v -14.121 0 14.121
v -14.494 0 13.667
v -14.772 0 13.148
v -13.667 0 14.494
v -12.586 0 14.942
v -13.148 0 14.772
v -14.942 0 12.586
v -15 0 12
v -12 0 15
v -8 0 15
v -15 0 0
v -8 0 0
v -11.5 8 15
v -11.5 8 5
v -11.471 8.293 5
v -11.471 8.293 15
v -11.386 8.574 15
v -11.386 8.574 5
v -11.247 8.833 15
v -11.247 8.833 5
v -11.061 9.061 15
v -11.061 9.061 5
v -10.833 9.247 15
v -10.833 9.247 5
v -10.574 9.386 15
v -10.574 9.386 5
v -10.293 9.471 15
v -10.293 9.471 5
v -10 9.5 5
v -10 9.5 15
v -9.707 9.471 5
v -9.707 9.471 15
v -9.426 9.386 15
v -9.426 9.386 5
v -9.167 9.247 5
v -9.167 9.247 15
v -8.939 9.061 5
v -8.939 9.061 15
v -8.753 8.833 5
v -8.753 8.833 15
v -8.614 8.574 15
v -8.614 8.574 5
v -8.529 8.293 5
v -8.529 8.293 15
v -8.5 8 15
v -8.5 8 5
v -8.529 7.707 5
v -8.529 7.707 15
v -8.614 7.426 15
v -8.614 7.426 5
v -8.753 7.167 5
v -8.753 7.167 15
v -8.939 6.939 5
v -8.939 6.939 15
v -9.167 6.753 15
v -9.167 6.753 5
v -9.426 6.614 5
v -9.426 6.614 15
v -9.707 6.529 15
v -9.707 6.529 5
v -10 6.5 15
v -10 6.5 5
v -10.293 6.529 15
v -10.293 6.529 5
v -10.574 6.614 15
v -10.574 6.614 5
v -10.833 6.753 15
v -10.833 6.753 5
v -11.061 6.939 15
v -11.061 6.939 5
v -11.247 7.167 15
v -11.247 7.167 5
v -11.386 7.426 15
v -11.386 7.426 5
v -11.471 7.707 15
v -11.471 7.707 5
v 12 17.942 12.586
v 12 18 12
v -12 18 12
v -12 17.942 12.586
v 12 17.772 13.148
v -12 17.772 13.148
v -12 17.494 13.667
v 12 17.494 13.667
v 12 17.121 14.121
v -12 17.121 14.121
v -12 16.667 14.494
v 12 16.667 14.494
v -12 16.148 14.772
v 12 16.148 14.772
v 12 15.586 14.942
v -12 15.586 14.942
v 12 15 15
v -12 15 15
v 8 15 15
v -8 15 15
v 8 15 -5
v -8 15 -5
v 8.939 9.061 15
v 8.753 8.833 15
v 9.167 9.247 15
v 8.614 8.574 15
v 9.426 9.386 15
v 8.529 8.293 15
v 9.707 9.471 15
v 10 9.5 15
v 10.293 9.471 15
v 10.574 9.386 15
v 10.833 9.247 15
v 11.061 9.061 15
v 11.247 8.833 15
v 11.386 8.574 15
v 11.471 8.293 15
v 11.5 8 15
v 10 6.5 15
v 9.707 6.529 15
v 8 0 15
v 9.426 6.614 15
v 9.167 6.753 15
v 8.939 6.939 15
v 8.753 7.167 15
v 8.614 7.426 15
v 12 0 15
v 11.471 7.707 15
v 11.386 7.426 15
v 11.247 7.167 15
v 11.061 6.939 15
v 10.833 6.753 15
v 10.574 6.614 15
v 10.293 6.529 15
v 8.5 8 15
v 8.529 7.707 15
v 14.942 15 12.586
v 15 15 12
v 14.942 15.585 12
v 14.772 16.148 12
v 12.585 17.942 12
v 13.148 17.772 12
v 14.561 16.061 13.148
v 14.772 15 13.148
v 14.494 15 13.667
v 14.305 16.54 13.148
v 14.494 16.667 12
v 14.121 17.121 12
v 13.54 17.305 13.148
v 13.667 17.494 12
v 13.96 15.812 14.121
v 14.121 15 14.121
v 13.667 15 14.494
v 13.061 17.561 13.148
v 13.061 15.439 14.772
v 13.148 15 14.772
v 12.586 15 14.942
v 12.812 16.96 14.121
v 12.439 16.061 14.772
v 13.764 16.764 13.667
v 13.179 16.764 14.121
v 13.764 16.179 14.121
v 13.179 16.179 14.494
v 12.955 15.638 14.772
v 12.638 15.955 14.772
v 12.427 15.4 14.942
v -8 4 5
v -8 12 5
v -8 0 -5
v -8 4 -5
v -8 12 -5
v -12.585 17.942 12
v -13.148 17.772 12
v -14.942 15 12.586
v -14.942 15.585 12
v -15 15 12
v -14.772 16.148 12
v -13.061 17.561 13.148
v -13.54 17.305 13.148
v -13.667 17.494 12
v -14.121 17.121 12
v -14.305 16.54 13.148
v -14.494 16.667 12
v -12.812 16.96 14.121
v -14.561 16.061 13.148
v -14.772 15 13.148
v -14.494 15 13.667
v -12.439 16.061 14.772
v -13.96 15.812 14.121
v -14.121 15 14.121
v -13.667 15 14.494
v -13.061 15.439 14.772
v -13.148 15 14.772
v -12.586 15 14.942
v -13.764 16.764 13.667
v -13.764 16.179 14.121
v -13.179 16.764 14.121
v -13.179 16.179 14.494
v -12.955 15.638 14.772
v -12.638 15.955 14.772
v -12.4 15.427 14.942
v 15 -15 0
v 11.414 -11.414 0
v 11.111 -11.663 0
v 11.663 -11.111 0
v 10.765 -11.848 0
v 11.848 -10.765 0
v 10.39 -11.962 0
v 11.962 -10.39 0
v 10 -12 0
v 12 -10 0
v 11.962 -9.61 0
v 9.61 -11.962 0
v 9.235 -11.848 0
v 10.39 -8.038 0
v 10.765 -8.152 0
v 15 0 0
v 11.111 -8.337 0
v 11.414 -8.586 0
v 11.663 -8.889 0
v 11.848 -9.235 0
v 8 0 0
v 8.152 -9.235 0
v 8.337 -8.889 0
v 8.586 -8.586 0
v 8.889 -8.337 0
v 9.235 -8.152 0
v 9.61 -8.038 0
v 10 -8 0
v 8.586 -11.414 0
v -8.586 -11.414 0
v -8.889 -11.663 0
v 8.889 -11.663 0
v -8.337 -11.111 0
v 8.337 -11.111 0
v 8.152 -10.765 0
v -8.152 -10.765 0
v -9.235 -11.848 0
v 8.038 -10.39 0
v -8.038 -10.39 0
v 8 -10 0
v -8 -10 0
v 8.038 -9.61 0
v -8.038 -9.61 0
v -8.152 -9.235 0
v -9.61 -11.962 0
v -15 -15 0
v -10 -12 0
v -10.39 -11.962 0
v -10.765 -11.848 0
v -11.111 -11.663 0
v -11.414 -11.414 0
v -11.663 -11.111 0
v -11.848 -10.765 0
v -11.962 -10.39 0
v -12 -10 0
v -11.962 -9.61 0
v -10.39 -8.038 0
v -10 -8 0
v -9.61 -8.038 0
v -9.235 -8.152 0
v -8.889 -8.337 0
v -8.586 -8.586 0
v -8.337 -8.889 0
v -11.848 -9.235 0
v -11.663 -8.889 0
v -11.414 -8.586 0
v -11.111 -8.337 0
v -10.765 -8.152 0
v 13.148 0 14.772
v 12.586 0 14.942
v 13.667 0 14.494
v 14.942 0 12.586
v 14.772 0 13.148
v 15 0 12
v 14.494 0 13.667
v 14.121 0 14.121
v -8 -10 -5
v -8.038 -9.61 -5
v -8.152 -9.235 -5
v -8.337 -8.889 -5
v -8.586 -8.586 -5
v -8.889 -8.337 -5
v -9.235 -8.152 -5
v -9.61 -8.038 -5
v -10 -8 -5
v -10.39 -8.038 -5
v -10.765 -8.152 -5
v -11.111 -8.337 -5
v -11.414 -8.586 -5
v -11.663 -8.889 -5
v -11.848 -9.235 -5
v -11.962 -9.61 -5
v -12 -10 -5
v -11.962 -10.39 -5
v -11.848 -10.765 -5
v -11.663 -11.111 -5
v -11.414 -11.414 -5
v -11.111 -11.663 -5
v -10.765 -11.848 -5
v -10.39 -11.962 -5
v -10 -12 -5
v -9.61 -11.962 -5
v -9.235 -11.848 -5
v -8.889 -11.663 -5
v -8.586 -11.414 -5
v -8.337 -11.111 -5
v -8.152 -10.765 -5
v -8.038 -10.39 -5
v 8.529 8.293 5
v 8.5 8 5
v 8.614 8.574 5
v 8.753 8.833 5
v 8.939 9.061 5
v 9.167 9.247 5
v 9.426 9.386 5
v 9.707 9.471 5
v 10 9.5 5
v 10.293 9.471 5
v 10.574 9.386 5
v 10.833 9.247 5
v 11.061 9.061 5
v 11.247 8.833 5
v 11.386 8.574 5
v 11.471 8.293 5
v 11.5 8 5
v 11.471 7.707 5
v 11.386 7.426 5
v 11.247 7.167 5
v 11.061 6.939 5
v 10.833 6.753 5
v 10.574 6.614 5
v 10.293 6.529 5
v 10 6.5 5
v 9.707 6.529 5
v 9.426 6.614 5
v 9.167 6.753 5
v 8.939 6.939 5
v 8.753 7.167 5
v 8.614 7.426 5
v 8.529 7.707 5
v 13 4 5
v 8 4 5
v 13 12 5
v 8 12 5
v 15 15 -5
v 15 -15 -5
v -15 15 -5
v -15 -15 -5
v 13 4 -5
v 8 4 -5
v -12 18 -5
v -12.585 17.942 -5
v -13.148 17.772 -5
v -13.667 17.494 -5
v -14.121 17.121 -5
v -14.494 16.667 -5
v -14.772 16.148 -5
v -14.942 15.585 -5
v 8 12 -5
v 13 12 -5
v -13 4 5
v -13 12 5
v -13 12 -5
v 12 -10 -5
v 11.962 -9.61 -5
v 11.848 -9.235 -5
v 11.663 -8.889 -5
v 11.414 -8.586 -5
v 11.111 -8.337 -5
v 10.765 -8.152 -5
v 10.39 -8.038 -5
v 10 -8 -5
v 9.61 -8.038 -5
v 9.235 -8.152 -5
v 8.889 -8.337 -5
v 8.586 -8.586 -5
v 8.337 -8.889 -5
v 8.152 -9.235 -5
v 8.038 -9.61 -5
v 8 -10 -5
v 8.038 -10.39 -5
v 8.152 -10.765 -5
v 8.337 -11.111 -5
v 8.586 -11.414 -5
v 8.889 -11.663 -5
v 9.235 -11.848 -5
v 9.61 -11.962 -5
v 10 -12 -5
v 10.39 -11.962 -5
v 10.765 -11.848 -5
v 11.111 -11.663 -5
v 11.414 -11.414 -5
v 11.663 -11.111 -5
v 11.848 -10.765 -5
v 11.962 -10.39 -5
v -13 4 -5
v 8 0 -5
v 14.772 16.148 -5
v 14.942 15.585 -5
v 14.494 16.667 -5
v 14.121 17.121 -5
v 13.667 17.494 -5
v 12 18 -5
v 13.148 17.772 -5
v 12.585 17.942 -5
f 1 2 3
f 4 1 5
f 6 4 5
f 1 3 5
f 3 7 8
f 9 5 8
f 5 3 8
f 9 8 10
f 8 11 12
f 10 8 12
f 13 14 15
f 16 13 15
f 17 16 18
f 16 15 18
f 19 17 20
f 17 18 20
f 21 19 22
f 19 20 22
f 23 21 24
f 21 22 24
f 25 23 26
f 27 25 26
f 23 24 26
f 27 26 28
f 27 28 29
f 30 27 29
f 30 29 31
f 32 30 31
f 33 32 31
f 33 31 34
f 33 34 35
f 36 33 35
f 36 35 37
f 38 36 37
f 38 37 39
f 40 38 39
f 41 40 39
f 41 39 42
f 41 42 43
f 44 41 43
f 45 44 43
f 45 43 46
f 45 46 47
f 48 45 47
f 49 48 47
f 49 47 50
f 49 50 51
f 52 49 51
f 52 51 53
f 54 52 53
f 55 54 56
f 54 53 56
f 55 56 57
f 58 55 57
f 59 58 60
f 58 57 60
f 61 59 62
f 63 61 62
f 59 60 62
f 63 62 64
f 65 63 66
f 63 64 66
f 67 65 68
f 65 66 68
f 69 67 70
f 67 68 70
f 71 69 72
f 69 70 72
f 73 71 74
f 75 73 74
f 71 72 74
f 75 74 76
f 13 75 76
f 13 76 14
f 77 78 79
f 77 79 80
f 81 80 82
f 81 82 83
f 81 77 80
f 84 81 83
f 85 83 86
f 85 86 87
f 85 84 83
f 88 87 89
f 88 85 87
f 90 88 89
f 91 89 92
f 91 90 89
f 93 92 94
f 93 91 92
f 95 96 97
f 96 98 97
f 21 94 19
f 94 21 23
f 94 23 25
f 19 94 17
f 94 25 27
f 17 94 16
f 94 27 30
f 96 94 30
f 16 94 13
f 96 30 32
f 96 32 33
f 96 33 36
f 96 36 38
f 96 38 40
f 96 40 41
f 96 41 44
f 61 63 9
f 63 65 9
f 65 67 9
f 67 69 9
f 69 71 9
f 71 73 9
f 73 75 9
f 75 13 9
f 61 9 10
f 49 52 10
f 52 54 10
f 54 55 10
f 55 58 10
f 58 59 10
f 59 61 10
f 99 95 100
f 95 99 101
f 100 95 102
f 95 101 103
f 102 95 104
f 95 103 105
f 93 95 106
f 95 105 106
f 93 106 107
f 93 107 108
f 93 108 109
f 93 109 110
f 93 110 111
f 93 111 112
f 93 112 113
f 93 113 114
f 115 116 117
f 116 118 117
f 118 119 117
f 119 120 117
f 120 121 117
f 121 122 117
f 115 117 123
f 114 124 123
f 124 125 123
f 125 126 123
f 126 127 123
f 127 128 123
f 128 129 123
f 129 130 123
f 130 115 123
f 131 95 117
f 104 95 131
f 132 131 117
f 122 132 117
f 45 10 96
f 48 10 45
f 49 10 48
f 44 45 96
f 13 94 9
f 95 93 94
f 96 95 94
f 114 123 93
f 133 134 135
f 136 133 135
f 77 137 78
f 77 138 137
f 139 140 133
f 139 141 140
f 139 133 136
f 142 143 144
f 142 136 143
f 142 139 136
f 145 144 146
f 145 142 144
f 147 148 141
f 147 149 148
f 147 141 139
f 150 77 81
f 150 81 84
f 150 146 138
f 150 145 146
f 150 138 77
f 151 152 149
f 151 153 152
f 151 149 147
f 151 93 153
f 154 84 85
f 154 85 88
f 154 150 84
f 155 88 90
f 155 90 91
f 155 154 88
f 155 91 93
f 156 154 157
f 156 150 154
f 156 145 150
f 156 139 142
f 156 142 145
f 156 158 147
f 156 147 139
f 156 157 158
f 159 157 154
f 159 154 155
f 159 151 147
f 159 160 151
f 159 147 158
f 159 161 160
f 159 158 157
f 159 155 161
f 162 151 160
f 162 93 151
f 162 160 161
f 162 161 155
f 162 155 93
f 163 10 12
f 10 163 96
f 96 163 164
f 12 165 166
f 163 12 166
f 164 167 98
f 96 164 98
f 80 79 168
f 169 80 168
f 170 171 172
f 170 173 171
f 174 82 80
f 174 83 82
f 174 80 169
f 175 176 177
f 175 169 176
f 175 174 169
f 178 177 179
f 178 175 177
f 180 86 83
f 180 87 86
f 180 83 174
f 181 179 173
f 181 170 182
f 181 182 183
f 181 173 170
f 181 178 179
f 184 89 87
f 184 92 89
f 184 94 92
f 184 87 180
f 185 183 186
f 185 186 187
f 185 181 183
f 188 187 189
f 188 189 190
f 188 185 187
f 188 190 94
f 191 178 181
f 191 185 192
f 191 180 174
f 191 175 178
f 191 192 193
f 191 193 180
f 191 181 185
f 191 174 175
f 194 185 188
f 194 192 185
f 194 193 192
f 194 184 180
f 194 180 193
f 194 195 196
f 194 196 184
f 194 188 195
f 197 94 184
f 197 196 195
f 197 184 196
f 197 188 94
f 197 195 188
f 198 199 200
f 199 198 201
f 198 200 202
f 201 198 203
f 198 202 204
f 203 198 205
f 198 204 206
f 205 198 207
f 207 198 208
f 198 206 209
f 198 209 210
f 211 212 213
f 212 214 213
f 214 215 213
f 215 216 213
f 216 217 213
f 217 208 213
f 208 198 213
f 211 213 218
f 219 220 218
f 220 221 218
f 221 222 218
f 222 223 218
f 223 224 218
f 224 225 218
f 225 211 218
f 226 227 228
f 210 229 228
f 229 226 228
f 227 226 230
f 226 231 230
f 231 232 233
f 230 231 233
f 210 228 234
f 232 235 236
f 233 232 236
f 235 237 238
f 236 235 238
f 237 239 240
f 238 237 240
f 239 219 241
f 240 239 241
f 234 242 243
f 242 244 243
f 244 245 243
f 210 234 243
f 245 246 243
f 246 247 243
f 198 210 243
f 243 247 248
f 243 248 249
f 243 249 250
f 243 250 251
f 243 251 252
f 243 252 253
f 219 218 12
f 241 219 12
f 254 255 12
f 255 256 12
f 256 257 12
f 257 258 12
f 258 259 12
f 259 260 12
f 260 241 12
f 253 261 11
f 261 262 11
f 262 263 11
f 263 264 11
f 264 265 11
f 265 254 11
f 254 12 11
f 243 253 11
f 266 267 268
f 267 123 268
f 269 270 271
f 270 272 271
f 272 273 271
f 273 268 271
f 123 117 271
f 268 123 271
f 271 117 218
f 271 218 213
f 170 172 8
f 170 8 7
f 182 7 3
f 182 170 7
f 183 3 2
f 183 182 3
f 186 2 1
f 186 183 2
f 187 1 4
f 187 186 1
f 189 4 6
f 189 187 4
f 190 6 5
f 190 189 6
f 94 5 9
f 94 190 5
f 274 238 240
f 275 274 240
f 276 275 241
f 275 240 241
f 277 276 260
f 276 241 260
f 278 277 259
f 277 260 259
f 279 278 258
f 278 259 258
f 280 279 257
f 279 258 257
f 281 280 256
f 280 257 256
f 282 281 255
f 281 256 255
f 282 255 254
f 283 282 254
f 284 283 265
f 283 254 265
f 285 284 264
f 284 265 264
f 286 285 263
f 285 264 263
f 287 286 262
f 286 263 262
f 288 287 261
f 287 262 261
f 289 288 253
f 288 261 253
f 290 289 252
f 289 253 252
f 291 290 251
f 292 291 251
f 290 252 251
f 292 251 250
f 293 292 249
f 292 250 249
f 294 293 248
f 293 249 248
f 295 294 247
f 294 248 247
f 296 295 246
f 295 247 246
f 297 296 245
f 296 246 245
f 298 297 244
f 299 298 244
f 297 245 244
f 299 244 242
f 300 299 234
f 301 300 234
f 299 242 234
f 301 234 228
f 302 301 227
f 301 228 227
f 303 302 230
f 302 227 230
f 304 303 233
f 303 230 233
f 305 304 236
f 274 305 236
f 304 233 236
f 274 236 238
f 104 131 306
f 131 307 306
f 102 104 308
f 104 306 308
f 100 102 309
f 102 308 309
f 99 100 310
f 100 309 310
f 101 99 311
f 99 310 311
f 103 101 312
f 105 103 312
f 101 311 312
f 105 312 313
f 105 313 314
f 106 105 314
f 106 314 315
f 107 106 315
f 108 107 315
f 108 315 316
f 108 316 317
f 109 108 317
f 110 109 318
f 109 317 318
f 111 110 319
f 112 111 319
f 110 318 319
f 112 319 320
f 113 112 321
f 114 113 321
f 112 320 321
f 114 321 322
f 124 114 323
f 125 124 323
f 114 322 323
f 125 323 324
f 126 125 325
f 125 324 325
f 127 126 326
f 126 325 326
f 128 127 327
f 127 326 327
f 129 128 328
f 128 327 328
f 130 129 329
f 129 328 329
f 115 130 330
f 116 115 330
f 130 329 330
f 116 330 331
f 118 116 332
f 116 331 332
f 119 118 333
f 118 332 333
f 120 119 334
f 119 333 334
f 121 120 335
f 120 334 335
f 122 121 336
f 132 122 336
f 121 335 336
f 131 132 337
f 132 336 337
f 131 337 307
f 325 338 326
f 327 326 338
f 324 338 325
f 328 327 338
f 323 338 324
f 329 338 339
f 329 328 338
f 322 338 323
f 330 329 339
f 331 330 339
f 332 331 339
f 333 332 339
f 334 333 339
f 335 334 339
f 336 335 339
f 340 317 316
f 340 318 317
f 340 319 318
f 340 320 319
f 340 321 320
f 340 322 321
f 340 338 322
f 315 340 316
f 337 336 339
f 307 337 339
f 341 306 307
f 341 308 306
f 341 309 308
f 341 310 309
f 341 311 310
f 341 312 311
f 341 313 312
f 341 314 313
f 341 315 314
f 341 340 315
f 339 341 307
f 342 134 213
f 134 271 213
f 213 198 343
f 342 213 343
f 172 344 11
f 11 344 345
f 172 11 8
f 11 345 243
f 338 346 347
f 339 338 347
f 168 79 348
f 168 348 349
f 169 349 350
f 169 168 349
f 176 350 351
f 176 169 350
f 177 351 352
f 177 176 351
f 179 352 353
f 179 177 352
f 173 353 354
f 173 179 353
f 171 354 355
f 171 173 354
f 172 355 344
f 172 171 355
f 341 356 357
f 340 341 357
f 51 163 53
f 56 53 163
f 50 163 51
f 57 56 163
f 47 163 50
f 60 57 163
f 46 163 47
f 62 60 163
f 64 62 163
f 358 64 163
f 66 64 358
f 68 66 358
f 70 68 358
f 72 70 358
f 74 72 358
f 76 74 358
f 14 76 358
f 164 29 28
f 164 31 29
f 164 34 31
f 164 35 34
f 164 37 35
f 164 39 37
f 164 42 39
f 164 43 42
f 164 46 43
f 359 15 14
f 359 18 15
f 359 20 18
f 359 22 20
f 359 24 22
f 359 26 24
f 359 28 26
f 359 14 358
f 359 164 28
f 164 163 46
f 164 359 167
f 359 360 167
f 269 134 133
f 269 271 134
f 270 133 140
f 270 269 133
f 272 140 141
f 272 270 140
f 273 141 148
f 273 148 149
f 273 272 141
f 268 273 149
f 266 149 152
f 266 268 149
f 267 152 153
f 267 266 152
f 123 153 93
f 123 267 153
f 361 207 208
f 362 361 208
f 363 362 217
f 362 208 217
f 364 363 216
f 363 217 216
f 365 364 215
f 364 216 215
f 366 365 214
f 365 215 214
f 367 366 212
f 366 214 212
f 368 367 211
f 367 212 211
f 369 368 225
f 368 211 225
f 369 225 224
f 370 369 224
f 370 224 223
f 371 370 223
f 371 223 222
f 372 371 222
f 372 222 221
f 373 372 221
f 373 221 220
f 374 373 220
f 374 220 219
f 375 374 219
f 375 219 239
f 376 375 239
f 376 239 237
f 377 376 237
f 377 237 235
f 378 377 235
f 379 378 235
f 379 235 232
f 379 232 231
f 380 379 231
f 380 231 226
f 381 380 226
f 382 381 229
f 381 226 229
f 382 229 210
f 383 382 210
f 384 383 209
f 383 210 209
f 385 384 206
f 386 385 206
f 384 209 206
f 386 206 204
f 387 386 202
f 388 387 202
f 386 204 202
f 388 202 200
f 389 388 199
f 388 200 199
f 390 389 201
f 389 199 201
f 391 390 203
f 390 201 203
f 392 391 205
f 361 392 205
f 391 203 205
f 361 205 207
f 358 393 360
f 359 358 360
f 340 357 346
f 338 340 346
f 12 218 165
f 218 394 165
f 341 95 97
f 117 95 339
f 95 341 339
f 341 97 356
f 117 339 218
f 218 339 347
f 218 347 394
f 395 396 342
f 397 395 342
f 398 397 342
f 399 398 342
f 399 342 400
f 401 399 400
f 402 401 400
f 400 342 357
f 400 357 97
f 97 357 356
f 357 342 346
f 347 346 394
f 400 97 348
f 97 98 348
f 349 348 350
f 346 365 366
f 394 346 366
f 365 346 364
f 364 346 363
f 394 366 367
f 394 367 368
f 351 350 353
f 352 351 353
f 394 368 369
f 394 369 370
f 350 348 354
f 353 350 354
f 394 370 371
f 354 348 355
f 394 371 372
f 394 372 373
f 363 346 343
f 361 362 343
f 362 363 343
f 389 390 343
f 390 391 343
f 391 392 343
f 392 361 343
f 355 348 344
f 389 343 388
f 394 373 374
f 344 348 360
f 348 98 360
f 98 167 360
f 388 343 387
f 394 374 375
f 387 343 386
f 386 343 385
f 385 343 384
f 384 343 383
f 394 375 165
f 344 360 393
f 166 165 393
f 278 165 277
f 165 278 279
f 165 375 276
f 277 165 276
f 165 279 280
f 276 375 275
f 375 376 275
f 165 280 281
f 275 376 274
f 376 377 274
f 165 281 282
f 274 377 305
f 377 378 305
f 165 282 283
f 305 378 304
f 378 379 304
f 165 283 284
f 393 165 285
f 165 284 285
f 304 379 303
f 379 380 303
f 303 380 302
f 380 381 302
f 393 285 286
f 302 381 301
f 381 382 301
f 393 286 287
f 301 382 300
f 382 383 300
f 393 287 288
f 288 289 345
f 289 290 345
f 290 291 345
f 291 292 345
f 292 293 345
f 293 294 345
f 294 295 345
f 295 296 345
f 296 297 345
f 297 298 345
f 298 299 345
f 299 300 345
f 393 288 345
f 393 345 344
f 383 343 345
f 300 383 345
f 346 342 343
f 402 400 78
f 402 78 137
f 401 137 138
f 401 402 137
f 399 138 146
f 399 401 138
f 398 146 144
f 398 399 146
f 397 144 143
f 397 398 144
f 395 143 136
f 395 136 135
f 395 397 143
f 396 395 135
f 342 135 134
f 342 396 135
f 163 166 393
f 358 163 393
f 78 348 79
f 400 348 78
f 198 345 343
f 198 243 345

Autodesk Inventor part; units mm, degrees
ref_plane "YZ Plane" through (0, 0, 0) normal (1, 0, 0) x (0, 1, 0)
ref_plane "XZ Plane" through (0, 0, 0) normal (0, 1, 0) x (-1, 0, 0)
ref_plane "XY Plane" through (0, 0, 0) normal (0, 0, 1) x (1, 0, 0)
sketch "Sketch1" plane through (0, 0, 0) normal (0, 0, 1) x (1, 0, 0)
  line L0 (-15, -10) -> (15, -10)
  line L1 (15, -10) -> (15, 10)
  line L2 (15, 10) -> (-15, 10)
  line L3 (-15, 10) -> (-15, -10)
  line L4 (-15, -10) -> (15, 10) construction
  line L5 (15, -10) -> (-15, 10) construction
  point P0 (0, 0)
  dimension "d0" = 30
  dimension "d1" = 20
extrude "Extrusion1" add sketch "Sketch1" against normal blind 5
sketch "Sketch2" plane through (0, 0, 0) normal (0, 0, 1) x (1, 0, 0)
  line L0 (-15, 0) -> (15, 0)
  line L1 (15, 0) -> (15, 15)
  line L2 (15, 15) -> (-15, 15)
  line L3 (-15, 15) -> (-15, 0)
  line L4 (-15, 0) -> (15, 15) construction
  line L5 (15, 0) -> (-15, 15) construction
  line L6 (15, 10) -> (-15, 10) projected
  line L7 (-15, 10) -> (-15, -10) projected
  point P0 (0, 0)
  point P1 (0, 7.5)
  dimension "d4" = 30
  dimension "d5" = 15
  dimension "d18" = 5
extrude "Extrusion2" add sketch "Sketch2" along normal blind 15
sketch "Sketch3" plane through (0, 0, 0) normal (0, 0, 1) x (1, 0, 0)
  circle A0 centre (10, -10) radius 2
  circle A1 centre (-10, -10) radius 2
  line L0 (-15, -10) -> (15, -10) projected
  line L1 (-15, 0) -> (-15, -10) projected
  point P0 (0, 0)
  dimension "d8" = 4
  dimension "d9" = 4
  dimension "d12" = 5
  dimension "d13" = 20
sketch "Sketch4" plane through (-15, -10, 0) normal (0, -1, 0) x (1, 0, 0)
  line L0 (0, -5) -> (30, -5)
  line L1 (30, -5) -> (30, 0)
  line L2 (30, 0) -> (0, 0)
  line L3 (0, 0) -> (0, -5)
  line L4 (0, -5) -> (30, 0) construction
  line L5 (30, -5) -> (0, 0) construction
  line L6 (0, 0) -> (30, 0) projected
  line L7 (30, 0) -> (30, -5) projected
  line L8 (0, 0) -> (0, -5) projected
  line L9 (30, -5) -> (0, -5) projected
  point P0 (15, 0)
  point P1 (15, -2.5)
extrude "Extrusion3" add sketch "Sketch4" along normal blind 5
extrude "Extrusion4" cut sketch "Sketch3" against normal blind 5
sketch "Sketch5" plane through (0, 0, -5) normal (0, 0, -1) x (-1, 0, 0)
  line L0 (-8, 0) -> (8, 0)
  line L1 (8, 0) -> (8, 15)
  line L2 (8, 15) -> (-8, 15)
  line L3 (-8, 15) -> (-8, 0)
  line L4 (-8, 0) -> (8, 15) construction
  line L5 (8, 0) -> (-8, 15) construction
  line L6 (-15, 15) -> (15, 15) projected
  point P0 (0, 0)
  point P1 (0, 7.5)
  dimension "d16" = 16
  dimension "d21" = 15
  dimension "d22" = 0
sketch "Sketch6" plane through (0, 0, 0) normal (0, 0, -1) x (-1, 0, 0)
  line L0 (-15, 10) -> (15, 10)
  line L1 (15, 10) -> (15, 15)
  line L2 (15, 15) -> (-15, 15)
  line L3 (-15, 15) -> (-15, 10)
  line L4 (-15, 10) -> (15, 15) construction
  line L5 (15, 10) -> (-15, 15) construction
  line L6 (-15, 15) -> (15, 15) projected
  line L7 (15, 10) -> (-15, 10) projected
  line L8 (-15, 10) -> (-15, 15) projected
  line L9 (15, 15) -> (15, 10) projected
  point P0 (0, 0)
  point P1 (0, 12.5)
extrude "Extrusion5" add sketch "Sketch6" along normal blind 5
extrude "Extrusion6" cut sketch "Sketch5" against normal through all
sketch "Sketch7" plane through (0, 0, -5) normal (0, 0, -1) x (-1, 0, 0)
  circle A0 centre (-10, 8) radius 1.5
  circle A1 centre (10, 8) radius 1.5
  line L0 (-15, 15) -> (-15, -15) projected
  line L1 (8, 0) -> (-8, 0) projected
  point P0 (0, 0)
  dimension "d25" = 3
  dimension "d26" = 3
  dimension "d27" = 20
  dimension "d28" = 5
  dimension "d33" = 8
extrude "Extrusion7" cut sketch "Sketch7" against normal through all
sketch "Sketch8" plane through (15, 15, 15) normal (0, 1, 0) x (1, 0, 0)
  line L0 (0, 20) -> (-30, 20)
  line L1 (-30, 20) -> (-30, 0)
  line L2 (-30, 0) -> (0, 0)
  line L3 (0, 0) -> (0, 20)
  line L4 (0, 20) -> (-30, 0) construction
  line L5 (-30, 20) -> (0, 0) construction
  line L6 (0, 0) -> (-7, 0) projected
  line L7 (0, 0) -> (0, 20) projected
  line L8 (-23, 20) -> (-7, 20) projected
  line L9 (-30, 20) -> (-30, 0) projected
  point P0 (-15, 15)
  point P1 (-15, 10)
extrude "Extrusion8" add sketch "Sketch8" along normal blind 3
sketch "Sketch9" plane through (0, 0, -5) normal (0, 0, -1) x (-1, 0, 0)
  line L0 (-13, 4) -> (-8, 4)
  line L1 (-8, 4) -> (-8, 12)
  line L2 (-8, 12) -> (-13, 12)
  line L3 (-13, 12) -> (-13, 4)
  line L4 (-13, 4) -> (-8, 12) construction
  line L5 (-8, 4) -> (-13, 12) construction
  line L6 (8, 4) -> (13, 4)
  line L7 (13, 4) -> (13, 12)
  line L8 (13, 12) -> (8, 12)
  line L9 (8, 12) -> (8, 4)
  line L10 (8, 4) -> (13, 12) construction
  line L11 (13, 4) -> (8, 12) construction
  line L12 (-8, 0) -> (-8, 15) projected
  line L13 (8, 15) -> (8, 0) projected
  line L14 (8, 0) -> (-8, 0) projected
  point P0 (0, 0)
  point P1 (-10.5, 8)
  point P2 (10.5, 8)
  dimension "d34" = 5
  dimension "d35" = 5
  dimension "d36" = 8
  dimension "d37" = 8
  dimension "d38" = 8
extrude "Extrusion9" cut sketch "Sketch9" against normal blind 10
fillet "Fillet1" radius 3 2 edges at (15, 18, 5) (-15, 18, 5)
fillet "Fillet2" radius 3 3 edges at (15, 7.5, 15) (-15, 7.5, 15) (0, 18, 15)
properties part number "IR_bracket"
